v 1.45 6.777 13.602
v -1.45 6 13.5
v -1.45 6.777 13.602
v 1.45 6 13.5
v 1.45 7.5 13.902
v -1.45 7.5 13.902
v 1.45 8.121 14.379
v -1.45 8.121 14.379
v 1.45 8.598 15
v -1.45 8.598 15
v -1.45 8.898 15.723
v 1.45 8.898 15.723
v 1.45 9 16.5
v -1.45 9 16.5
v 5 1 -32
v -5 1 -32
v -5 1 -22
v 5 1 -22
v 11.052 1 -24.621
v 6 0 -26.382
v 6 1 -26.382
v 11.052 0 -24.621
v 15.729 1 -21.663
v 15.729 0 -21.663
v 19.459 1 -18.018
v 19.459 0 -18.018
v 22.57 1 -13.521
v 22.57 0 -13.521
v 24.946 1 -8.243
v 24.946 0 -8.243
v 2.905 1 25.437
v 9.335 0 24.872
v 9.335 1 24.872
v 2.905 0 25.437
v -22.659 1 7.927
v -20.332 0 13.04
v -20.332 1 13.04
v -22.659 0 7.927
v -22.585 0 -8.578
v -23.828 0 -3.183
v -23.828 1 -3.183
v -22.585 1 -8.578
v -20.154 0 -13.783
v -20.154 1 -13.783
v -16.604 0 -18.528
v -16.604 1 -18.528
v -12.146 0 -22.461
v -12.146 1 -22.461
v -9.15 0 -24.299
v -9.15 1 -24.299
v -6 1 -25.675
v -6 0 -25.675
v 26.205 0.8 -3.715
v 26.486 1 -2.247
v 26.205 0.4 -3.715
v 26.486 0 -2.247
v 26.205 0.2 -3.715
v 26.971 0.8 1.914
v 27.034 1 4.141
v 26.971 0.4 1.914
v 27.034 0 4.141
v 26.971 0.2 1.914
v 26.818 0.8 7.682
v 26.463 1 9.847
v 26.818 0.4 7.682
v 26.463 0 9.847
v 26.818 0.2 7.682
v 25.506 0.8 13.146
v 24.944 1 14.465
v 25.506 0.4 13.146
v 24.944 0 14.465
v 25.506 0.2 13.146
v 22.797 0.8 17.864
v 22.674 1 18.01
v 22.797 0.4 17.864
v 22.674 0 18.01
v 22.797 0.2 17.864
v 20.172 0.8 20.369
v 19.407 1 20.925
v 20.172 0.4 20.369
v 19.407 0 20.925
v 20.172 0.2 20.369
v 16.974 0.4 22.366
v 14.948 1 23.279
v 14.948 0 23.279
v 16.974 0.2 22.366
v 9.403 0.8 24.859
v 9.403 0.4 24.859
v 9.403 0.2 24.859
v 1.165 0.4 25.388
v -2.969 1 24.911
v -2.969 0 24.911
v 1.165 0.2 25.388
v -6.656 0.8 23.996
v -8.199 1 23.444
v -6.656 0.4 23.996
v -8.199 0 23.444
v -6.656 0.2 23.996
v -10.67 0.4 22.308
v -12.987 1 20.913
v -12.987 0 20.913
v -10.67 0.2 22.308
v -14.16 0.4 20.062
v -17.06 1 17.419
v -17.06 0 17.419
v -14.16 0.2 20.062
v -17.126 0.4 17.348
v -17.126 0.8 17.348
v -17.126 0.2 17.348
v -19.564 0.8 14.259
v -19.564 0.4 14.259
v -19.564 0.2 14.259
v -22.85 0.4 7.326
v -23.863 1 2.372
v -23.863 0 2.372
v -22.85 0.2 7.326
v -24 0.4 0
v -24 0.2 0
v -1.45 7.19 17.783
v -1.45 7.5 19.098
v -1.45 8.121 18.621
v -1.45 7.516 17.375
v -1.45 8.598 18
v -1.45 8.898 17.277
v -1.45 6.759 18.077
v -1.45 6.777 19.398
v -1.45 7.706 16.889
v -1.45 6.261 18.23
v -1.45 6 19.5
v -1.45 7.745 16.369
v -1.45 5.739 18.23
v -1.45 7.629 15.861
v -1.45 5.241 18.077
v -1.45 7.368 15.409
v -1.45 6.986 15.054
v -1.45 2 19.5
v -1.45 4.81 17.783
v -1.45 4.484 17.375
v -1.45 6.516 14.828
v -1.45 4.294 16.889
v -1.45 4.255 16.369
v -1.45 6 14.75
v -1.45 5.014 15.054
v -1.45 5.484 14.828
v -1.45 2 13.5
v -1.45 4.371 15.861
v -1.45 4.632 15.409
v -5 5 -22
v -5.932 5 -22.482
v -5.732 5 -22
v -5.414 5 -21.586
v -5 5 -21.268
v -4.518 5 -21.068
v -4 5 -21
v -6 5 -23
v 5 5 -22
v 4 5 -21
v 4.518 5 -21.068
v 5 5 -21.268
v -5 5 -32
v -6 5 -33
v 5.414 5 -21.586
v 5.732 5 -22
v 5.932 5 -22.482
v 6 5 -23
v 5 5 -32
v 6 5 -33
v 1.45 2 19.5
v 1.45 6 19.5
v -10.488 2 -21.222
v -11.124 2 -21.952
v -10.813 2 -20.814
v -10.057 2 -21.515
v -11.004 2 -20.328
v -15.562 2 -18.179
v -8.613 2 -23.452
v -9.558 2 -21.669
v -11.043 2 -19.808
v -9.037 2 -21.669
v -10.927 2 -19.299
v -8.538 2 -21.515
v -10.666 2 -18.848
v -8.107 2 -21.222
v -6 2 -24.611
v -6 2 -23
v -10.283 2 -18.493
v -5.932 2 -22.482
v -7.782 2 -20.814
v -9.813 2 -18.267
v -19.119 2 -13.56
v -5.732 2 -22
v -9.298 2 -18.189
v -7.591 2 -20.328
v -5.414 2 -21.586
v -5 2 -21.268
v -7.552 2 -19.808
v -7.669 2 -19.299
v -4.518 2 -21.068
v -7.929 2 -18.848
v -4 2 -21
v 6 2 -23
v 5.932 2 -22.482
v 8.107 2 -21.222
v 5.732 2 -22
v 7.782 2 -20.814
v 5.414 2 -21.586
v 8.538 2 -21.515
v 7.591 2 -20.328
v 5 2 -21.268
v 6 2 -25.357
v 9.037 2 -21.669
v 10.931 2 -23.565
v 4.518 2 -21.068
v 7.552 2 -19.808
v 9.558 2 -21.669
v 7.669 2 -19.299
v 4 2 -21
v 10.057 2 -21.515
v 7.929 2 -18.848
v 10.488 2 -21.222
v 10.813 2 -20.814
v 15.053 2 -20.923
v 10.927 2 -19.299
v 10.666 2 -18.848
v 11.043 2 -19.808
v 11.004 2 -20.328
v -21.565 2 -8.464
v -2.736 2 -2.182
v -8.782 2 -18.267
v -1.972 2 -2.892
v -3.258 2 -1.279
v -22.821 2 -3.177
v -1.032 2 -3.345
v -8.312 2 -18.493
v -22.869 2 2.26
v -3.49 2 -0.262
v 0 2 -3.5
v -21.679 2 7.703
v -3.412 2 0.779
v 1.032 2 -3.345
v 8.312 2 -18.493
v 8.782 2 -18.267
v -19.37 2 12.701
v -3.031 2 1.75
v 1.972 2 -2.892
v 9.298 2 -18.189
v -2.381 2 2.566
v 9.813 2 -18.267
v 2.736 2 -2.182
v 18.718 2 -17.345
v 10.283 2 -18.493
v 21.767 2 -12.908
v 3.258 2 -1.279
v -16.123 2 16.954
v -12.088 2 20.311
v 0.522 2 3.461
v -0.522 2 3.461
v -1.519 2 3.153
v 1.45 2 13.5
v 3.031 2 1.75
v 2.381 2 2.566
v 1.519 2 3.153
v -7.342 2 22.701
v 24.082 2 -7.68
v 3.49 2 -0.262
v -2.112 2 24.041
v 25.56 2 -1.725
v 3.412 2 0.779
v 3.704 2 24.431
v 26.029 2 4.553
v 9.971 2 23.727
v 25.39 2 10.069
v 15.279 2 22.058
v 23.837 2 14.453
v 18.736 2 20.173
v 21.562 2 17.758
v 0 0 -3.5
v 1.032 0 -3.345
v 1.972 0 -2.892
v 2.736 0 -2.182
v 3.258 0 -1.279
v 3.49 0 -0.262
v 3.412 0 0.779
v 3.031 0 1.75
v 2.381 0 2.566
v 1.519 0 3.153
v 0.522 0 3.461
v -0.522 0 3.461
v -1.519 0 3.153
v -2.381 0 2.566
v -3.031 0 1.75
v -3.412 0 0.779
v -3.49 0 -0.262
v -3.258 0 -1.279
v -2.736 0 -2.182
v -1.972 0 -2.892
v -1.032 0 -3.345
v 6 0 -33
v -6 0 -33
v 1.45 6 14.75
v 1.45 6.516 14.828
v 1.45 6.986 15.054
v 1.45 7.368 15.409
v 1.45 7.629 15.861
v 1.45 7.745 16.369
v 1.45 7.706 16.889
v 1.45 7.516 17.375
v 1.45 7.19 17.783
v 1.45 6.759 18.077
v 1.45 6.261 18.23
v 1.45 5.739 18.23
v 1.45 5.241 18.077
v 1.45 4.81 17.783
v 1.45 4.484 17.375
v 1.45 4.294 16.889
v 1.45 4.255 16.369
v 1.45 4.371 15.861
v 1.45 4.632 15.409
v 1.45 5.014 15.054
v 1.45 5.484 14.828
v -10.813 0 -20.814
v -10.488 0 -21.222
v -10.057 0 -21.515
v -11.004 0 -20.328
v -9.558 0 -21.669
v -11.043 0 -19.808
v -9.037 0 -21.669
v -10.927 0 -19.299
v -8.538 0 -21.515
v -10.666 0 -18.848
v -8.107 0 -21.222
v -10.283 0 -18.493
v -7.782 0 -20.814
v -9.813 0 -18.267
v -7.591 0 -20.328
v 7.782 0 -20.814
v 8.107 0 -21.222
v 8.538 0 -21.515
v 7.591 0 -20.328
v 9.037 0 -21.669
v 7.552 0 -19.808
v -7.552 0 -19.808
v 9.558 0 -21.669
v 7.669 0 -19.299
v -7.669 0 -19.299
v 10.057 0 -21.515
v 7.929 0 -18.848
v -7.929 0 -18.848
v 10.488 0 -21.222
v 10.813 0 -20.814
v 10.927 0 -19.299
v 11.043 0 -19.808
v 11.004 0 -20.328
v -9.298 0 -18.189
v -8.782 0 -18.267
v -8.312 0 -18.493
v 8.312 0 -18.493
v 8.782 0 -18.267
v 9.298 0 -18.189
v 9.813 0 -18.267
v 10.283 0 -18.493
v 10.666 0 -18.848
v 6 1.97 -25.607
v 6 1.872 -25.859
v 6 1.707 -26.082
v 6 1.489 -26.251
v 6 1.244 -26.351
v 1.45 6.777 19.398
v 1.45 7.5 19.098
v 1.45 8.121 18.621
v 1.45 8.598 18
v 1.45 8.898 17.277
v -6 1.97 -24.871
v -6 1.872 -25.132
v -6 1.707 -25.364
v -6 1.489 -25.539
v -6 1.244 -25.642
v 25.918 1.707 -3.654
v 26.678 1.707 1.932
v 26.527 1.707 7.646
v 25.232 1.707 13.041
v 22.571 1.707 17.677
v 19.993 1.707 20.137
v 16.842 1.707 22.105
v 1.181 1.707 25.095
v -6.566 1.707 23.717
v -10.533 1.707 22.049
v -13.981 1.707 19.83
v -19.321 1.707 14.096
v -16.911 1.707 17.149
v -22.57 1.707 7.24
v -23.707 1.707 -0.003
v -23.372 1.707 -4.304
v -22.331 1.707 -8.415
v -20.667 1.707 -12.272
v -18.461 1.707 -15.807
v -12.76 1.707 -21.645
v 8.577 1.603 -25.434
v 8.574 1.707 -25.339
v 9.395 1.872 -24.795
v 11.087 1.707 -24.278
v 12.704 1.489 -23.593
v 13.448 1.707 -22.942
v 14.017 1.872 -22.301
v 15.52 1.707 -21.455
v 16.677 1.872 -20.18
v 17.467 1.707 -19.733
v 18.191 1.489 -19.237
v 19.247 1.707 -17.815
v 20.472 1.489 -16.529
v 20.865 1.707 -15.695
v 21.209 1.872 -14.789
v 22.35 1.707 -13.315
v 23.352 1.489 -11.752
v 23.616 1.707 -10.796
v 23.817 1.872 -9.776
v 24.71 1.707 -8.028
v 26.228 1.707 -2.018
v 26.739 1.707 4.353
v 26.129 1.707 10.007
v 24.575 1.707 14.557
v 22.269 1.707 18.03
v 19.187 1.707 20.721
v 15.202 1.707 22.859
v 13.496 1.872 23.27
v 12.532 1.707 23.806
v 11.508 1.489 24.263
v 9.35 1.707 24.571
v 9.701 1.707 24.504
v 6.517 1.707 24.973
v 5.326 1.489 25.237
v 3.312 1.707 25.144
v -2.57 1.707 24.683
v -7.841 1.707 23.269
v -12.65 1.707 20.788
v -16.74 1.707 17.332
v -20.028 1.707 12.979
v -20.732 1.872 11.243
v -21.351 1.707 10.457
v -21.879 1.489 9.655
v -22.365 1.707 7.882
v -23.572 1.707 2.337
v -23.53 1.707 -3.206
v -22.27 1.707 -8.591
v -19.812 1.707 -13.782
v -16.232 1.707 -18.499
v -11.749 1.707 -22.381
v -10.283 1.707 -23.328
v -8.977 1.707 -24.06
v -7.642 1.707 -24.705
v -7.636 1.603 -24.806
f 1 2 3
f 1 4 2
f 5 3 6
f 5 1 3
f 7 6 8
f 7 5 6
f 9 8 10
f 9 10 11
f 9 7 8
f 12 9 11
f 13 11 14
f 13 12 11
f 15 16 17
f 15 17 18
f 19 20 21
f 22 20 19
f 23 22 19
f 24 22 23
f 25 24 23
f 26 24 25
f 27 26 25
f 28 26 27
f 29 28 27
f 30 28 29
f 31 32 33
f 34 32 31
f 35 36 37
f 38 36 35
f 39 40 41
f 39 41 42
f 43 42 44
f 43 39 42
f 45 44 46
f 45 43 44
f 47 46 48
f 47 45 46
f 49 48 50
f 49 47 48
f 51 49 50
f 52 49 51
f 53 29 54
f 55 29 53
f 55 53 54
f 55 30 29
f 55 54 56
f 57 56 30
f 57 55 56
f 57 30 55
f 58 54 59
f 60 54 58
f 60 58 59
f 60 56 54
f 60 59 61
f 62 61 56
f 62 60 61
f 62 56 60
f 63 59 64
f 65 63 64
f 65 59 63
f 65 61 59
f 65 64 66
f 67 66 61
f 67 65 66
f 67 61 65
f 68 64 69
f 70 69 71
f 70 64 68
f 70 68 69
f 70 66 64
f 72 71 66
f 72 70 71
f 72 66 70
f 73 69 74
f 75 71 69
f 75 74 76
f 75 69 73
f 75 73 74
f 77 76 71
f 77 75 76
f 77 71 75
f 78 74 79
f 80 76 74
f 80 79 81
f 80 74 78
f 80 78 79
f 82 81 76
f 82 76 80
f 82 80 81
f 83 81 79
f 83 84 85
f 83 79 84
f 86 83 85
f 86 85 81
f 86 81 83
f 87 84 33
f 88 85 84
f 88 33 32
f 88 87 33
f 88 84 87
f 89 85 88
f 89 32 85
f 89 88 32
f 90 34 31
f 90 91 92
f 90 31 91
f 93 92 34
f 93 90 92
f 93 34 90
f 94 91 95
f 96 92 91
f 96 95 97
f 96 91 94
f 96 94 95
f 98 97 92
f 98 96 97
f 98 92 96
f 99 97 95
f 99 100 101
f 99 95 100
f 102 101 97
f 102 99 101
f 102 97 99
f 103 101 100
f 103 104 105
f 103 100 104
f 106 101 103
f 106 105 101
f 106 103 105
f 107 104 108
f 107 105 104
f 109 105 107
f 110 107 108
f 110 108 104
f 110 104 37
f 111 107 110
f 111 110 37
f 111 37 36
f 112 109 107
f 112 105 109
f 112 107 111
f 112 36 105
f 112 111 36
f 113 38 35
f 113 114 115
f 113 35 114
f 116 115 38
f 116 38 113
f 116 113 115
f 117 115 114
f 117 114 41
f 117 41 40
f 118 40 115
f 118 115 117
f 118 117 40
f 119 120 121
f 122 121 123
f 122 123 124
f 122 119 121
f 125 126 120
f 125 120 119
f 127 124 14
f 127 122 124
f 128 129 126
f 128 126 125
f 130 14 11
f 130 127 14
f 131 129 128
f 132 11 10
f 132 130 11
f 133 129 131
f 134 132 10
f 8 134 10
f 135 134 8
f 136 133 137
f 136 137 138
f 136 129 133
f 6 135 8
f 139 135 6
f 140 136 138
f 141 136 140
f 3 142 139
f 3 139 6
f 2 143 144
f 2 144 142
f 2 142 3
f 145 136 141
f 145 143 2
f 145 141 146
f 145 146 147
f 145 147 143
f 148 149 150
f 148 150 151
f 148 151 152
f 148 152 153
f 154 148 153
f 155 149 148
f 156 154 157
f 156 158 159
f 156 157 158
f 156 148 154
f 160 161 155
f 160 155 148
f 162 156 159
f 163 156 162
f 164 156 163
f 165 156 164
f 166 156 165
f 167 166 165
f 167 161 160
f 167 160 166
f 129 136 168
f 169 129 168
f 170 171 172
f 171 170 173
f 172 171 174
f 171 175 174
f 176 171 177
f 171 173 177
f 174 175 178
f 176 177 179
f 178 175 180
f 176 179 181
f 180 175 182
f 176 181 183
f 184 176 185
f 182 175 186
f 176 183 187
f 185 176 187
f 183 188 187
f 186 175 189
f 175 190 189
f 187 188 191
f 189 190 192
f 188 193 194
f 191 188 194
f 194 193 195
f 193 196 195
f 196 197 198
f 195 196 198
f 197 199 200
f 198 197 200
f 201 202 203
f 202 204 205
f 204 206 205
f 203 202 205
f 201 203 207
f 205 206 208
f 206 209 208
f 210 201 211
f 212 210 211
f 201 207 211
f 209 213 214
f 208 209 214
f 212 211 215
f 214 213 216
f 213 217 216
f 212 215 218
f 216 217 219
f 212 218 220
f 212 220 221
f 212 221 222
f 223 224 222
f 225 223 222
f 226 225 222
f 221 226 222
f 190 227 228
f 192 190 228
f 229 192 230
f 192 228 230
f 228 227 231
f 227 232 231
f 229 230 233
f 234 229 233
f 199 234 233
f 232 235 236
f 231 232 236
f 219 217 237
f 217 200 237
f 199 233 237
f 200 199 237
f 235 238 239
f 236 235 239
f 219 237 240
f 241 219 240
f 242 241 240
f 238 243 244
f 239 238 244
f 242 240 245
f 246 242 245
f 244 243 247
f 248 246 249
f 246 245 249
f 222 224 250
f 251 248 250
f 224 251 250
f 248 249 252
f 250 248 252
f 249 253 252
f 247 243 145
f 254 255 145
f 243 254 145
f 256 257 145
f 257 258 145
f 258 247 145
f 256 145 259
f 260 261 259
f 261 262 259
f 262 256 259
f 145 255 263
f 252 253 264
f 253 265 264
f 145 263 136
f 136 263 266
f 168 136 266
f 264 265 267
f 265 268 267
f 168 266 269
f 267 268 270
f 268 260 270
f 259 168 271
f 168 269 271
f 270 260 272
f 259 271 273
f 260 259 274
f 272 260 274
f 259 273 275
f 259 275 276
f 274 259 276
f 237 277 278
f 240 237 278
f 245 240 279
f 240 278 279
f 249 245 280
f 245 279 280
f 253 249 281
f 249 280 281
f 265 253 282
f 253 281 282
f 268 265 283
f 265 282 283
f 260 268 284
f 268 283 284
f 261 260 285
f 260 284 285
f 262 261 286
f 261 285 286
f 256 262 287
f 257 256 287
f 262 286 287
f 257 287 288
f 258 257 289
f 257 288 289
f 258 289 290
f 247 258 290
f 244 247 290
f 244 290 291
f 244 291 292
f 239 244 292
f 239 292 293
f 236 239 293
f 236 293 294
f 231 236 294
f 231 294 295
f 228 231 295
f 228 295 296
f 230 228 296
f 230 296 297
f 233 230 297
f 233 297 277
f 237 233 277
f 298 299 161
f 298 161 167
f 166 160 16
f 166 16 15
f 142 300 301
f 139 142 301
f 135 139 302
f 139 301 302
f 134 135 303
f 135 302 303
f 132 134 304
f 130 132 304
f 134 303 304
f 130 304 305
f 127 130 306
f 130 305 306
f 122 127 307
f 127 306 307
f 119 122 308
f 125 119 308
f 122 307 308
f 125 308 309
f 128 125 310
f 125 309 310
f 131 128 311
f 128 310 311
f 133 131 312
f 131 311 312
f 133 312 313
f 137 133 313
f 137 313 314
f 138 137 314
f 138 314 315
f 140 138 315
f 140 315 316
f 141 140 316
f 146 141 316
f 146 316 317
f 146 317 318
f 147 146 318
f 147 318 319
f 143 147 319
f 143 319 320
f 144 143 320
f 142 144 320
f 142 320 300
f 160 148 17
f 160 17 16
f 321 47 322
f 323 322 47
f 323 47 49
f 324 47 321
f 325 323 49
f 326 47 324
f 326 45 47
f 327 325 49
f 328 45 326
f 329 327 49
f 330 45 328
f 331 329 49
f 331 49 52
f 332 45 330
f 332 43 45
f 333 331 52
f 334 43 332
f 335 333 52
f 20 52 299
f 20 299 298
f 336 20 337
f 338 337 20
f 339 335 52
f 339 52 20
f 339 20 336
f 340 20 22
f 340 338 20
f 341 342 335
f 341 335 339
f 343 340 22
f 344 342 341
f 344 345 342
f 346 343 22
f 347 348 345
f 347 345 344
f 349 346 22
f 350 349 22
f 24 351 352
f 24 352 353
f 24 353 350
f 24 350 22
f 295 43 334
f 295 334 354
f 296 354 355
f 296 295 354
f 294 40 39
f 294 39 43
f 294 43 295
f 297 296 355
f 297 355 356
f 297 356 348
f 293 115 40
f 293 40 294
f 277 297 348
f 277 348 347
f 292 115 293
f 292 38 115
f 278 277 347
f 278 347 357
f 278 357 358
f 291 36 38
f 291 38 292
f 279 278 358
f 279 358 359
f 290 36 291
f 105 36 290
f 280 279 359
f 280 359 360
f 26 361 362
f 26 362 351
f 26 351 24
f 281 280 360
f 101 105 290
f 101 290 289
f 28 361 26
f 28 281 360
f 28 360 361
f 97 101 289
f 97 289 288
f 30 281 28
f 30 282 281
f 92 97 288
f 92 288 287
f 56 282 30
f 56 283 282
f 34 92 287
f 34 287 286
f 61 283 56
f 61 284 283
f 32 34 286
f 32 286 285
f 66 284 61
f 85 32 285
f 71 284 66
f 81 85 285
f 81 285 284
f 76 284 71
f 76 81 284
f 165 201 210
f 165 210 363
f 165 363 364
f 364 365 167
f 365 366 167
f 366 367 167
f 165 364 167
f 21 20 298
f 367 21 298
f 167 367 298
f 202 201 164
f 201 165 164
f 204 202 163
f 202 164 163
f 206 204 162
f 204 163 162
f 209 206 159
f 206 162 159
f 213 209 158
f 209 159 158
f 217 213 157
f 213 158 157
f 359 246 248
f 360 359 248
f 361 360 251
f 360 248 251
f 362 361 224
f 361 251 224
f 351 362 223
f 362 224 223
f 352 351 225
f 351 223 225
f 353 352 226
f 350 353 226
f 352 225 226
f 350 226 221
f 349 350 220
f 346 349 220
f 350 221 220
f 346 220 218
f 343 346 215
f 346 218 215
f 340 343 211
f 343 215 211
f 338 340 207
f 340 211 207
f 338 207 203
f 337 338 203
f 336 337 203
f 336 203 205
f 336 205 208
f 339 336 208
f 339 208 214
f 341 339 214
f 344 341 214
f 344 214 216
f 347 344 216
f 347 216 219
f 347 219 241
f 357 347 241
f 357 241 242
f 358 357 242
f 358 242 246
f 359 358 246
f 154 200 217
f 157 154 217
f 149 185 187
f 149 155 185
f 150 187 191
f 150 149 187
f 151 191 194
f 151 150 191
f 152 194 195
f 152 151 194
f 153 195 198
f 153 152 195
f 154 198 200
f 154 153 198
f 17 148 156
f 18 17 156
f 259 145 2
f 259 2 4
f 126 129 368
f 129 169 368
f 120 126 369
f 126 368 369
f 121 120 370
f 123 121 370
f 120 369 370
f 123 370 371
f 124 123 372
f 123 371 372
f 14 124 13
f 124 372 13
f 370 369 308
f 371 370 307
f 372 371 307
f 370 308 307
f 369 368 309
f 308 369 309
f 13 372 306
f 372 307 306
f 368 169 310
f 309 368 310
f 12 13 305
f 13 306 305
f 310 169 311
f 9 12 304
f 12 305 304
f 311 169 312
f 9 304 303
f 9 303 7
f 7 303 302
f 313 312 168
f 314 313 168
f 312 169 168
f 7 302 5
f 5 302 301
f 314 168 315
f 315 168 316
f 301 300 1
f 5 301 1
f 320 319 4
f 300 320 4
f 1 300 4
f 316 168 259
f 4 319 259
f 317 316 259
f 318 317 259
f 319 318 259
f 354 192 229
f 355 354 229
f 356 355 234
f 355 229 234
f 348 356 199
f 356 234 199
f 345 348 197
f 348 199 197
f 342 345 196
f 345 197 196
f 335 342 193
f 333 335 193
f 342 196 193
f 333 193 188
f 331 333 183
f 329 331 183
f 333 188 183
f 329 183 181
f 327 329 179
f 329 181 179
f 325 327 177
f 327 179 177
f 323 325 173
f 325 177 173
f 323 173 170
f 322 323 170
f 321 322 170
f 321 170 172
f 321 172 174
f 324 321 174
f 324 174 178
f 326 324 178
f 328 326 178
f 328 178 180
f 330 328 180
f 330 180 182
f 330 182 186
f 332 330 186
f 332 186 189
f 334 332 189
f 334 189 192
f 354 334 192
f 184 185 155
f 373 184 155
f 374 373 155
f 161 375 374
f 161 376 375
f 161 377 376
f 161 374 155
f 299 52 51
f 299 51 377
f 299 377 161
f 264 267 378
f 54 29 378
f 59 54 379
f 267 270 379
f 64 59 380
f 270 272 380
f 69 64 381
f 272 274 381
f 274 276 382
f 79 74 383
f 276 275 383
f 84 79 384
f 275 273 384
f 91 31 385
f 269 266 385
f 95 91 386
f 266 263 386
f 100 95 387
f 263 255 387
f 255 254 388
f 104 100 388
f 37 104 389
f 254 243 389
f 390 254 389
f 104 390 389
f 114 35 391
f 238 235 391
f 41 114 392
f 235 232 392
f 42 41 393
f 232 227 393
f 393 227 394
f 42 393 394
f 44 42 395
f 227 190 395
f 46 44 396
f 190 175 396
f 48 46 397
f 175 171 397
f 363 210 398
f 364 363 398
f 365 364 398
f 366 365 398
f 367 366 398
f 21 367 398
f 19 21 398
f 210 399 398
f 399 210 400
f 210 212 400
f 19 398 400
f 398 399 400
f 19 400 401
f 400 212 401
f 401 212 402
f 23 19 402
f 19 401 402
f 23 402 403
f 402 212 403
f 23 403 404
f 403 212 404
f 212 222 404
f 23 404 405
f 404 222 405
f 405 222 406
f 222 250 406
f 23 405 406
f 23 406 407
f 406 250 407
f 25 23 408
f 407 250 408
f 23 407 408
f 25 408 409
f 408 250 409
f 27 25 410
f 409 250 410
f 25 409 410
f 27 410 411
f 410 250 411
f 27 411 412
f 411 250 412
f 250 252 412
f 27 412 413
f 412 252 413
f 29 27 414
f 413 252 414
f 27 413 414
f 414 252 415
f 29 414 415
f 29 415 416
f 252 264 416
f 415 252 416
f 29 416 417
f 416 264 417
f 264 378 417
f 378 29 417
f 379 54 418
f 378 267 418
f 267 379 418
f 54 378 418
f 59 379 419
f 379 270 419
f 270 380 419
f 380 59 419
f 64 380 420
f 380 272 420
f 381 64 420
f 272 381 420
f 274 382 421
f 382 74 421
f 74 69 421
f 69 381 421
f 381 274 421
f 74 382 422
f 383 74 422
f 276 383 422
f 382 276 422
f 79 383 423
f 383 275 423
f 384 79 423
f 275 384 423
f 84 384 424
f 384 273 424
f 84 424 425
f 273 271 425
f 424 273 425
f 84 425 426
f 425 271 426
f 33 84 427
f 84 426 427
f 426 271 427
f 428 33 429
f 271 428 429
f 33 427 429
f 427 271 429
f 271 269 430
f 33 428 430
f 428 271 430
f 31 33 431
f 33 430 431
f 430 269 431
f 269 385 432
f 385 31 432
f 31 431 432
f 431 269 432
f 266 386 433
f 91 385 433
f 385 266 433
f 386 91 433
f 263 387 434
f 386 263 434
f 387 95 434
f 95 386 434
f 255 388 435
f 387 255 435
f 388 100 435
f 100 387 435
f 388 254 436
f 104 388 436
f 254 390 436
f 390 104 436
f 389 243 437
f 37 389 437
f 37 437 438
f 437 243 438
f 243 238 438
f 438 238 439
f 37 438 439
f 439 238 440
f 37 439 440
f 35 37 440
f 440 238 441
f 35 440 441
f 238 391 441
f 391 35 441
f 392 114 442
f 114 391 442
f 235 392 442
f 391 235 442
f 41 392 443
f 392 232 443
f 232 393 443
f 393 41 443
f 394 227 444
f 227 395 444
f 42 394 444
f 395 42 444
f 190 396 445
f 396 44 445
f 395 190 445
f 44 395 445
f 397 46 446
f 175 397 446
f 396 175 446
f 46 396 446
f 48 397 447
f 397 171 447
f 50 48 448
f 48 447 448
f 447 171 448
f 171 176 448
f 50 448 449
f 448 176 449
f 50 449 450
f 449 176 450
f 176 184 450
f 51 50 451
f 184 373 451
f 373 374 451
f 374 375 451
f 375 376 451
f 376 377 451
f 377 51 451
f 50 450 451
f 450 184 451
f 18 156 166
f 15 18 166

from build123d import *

# Parameters (mm, degrees)
BOSS_EXTRUDE1_DEPTH = 2
SKETCH53_R          = 3.5
CUT_EXTRUDE1_DEPTH  = 39.196778302
CUT_EXTRUDE2_REACH  = 40.197
SKETCH54_R          = 1.75
SKETCH58_W          = 2.9
SKETCH58_H          = 6
BOSS_EXTRUDE3_DEPTH = 7
CUT_EXTRUDE5_REACH  = 40.206
SKETCH59_R          = 1.75
FILLET2_R           = 3
SKETCH62_W          = 12
SKETCH62_H          = 12
BOSS_EXTRUDE5_DEPTH = 5
SKETCH63_W          = 10
SKETCH63_H          = 10
CUT_EXTRUDE6_DEPTH  = 4
FILLET4_R           = 2
FILLET5_R           = 1


with BuildPart() as part:
    # Sketch1 → Boss-Extrude1 (new body)
    with BuildSketch(Plane.XZ):
        with BuildLine():
            add(Edge.make_bspline(
                [(-5, -26), (7.786549371, -29.827455575), (28.431061215, -18.009613356), (27.073140257, 23.791056835), (-13.092194035, 29.335293652), (-31.25538501, -3.658967579), (-15.156693843, -22.959750959), (-5, -26)],
                knots=[0, 0, 0, 0, 0.296836273, 0.417767996, 0.576795533, 0.764215109, 1, 1, 1, 1], degree=3))
        make_face()
    extrude(amount=-BOSS_EXTRUDE1_DEPTH)

    # Sketch53 → Cut-Extrude1 (cut, through all)
    with BuildSketch(Plane.XZ):
        with Locations(Location((0, 0, 0), (0, 0, 270))):
            Circle(SKETCH53_R)
    extrude(amount=-CUT_EXTRUDE1_DEPTH, mode=Mode.SUBTRACT)

    # Sketch54 → Cut-Extrude2 (cut, up to next)
    with BuildSketch(Plane(origin=(0, 2, 0), x_dir=(1, 0, 0), z_dir=(0, 1, 0)), mode=Mode.PRIVATE) as cut_extrude2_sk1:
        with Locations(Location((9.297601758, 19.938771315, 0), (0, 0, 270))):
            Circle(SKETCH54_R)
    cut_extrude2_tool1 = extrude(cut_extrude2_sk1.sketch, amount=-CUT_EXTRUDE2_REACH, mode=Mode.PRIVATE) & part.part
    # Sketch54 → Cut-Extrude2 (cut, up to next)
    with BuildSketch(Plane(origin=(0, 2, 0), x_dir=(1, 0, 0), z_dir=(0, 1, 0)), mode=Mode.PRIVATE) as cut_extrude2_sk2:
        with Locations(Location((-9.297601758, 19.938771315, 0), (0, 0, 270))):
            Circle(SKETCH54_R)
    cut_extrude2_tool2 = extrude(cut_extrude2_sk2.sketch, amount=-CUT_EXTRUDE2_REACH, mode=Mode.PRIVATE) & part.part
    add(cut_extrude2_tool1.solids().sort_by_distance((9.297602, 2, -19.938771))[0], mode=Mode.SUBTRACT)
    add(cut_extrude2_tool2.solids().sort_by_distance((-9.297602, 2, -19.938771))[0], mode=Mode.SUBTRACT)

    # Sketch58 → Boss-Extrude3 (add)
    with BuildSketch(Plane(origin=(0, 2, 0), x_dir=(1, 0, 0), z_dir=(0, 1, 0))):
        with Locations((0, -16.5)):
            Rectangle(SKETCH58_W, SKETCH58_H)
    extrude(amount=BOSS_EXTRUDE3_DEPTH)

    # Sketch59 → Cut-Extrude5 (cut, up to next)
    with BuildSketch(Plane(origin=(1.45, 0, 0), x_dir=(0, 0, -1), z_dir=(1, 0, 0)), mode=Mode.PRIVATE) as cut_extrude5_sk1:
        with Locations((-16.5, 6)):
            Circle(SKETCH59_R)
    cut_extrude5_tool1 = extrude(cut_extrude5_sk1.sketch, amount=-CUT_EXTRUDE5_REACH, mode=Mode.PRIVATE) & part.part
    add(cut_extrude5_tool1.solids().sort_by_distance((1.45, 6, 16.5))[0], mode=Mode.SUBTRACT)

    # Fillet2
    fillet2_edges = [part.edges().sort_by_distance(p)[0] for p in [
        (0, 9, 13.5),
        (0, 9, 19.5),
    ]]
    fillet(fillet2_edges, radius=FILLET2_R - 0.0001)  # a hair under: the kernel refuses the full size

    # Sketch62 → Boss-Extrude5 (add)
    with BuildSketch(Plane(origin=(0, 0, 0), x_dir=(1, 0, 0), z_dir=(0, 1, 0))):
        with Locations((0, 27)):
            Rectangle(SKETCH62_W, SKETCH62_H)
    extrude(amount=BOSS_EXTRUDE5_DEPTH)

    # Sketch63 → Cut-Extrude6 (cut)
    with BuildSketch(Plane(origin=(0, 5, 0), x_dir=(1, 0, 0), z_dir=(0, 1, 0))):
        with Locations((0, 27)):
            Rectangle(SKETCH63_W, SKETCH63_H)
    extrude(amount=-CUT_EXTRUDE6_DEPTH, mode=Mode.SUBTRACT)

    # Fillet4
    fillet4_edges = [part.edges().sort_by_distance(p)[0] for p in [
        (6, 3.5, -21),
        (-6, 3.5, -21),
    ]]
    fillet(fillet4_edges, radius=FILLET4_R)

    # Fillet5
    fillet5_edges = [part.edges().sort_by_distance(p)[0] for p in [
        (3.875911824, 2, 25.42804335),
    ]]
    fillet(fillet5_edges, radius=FILLET5_R)


solid = part.part
